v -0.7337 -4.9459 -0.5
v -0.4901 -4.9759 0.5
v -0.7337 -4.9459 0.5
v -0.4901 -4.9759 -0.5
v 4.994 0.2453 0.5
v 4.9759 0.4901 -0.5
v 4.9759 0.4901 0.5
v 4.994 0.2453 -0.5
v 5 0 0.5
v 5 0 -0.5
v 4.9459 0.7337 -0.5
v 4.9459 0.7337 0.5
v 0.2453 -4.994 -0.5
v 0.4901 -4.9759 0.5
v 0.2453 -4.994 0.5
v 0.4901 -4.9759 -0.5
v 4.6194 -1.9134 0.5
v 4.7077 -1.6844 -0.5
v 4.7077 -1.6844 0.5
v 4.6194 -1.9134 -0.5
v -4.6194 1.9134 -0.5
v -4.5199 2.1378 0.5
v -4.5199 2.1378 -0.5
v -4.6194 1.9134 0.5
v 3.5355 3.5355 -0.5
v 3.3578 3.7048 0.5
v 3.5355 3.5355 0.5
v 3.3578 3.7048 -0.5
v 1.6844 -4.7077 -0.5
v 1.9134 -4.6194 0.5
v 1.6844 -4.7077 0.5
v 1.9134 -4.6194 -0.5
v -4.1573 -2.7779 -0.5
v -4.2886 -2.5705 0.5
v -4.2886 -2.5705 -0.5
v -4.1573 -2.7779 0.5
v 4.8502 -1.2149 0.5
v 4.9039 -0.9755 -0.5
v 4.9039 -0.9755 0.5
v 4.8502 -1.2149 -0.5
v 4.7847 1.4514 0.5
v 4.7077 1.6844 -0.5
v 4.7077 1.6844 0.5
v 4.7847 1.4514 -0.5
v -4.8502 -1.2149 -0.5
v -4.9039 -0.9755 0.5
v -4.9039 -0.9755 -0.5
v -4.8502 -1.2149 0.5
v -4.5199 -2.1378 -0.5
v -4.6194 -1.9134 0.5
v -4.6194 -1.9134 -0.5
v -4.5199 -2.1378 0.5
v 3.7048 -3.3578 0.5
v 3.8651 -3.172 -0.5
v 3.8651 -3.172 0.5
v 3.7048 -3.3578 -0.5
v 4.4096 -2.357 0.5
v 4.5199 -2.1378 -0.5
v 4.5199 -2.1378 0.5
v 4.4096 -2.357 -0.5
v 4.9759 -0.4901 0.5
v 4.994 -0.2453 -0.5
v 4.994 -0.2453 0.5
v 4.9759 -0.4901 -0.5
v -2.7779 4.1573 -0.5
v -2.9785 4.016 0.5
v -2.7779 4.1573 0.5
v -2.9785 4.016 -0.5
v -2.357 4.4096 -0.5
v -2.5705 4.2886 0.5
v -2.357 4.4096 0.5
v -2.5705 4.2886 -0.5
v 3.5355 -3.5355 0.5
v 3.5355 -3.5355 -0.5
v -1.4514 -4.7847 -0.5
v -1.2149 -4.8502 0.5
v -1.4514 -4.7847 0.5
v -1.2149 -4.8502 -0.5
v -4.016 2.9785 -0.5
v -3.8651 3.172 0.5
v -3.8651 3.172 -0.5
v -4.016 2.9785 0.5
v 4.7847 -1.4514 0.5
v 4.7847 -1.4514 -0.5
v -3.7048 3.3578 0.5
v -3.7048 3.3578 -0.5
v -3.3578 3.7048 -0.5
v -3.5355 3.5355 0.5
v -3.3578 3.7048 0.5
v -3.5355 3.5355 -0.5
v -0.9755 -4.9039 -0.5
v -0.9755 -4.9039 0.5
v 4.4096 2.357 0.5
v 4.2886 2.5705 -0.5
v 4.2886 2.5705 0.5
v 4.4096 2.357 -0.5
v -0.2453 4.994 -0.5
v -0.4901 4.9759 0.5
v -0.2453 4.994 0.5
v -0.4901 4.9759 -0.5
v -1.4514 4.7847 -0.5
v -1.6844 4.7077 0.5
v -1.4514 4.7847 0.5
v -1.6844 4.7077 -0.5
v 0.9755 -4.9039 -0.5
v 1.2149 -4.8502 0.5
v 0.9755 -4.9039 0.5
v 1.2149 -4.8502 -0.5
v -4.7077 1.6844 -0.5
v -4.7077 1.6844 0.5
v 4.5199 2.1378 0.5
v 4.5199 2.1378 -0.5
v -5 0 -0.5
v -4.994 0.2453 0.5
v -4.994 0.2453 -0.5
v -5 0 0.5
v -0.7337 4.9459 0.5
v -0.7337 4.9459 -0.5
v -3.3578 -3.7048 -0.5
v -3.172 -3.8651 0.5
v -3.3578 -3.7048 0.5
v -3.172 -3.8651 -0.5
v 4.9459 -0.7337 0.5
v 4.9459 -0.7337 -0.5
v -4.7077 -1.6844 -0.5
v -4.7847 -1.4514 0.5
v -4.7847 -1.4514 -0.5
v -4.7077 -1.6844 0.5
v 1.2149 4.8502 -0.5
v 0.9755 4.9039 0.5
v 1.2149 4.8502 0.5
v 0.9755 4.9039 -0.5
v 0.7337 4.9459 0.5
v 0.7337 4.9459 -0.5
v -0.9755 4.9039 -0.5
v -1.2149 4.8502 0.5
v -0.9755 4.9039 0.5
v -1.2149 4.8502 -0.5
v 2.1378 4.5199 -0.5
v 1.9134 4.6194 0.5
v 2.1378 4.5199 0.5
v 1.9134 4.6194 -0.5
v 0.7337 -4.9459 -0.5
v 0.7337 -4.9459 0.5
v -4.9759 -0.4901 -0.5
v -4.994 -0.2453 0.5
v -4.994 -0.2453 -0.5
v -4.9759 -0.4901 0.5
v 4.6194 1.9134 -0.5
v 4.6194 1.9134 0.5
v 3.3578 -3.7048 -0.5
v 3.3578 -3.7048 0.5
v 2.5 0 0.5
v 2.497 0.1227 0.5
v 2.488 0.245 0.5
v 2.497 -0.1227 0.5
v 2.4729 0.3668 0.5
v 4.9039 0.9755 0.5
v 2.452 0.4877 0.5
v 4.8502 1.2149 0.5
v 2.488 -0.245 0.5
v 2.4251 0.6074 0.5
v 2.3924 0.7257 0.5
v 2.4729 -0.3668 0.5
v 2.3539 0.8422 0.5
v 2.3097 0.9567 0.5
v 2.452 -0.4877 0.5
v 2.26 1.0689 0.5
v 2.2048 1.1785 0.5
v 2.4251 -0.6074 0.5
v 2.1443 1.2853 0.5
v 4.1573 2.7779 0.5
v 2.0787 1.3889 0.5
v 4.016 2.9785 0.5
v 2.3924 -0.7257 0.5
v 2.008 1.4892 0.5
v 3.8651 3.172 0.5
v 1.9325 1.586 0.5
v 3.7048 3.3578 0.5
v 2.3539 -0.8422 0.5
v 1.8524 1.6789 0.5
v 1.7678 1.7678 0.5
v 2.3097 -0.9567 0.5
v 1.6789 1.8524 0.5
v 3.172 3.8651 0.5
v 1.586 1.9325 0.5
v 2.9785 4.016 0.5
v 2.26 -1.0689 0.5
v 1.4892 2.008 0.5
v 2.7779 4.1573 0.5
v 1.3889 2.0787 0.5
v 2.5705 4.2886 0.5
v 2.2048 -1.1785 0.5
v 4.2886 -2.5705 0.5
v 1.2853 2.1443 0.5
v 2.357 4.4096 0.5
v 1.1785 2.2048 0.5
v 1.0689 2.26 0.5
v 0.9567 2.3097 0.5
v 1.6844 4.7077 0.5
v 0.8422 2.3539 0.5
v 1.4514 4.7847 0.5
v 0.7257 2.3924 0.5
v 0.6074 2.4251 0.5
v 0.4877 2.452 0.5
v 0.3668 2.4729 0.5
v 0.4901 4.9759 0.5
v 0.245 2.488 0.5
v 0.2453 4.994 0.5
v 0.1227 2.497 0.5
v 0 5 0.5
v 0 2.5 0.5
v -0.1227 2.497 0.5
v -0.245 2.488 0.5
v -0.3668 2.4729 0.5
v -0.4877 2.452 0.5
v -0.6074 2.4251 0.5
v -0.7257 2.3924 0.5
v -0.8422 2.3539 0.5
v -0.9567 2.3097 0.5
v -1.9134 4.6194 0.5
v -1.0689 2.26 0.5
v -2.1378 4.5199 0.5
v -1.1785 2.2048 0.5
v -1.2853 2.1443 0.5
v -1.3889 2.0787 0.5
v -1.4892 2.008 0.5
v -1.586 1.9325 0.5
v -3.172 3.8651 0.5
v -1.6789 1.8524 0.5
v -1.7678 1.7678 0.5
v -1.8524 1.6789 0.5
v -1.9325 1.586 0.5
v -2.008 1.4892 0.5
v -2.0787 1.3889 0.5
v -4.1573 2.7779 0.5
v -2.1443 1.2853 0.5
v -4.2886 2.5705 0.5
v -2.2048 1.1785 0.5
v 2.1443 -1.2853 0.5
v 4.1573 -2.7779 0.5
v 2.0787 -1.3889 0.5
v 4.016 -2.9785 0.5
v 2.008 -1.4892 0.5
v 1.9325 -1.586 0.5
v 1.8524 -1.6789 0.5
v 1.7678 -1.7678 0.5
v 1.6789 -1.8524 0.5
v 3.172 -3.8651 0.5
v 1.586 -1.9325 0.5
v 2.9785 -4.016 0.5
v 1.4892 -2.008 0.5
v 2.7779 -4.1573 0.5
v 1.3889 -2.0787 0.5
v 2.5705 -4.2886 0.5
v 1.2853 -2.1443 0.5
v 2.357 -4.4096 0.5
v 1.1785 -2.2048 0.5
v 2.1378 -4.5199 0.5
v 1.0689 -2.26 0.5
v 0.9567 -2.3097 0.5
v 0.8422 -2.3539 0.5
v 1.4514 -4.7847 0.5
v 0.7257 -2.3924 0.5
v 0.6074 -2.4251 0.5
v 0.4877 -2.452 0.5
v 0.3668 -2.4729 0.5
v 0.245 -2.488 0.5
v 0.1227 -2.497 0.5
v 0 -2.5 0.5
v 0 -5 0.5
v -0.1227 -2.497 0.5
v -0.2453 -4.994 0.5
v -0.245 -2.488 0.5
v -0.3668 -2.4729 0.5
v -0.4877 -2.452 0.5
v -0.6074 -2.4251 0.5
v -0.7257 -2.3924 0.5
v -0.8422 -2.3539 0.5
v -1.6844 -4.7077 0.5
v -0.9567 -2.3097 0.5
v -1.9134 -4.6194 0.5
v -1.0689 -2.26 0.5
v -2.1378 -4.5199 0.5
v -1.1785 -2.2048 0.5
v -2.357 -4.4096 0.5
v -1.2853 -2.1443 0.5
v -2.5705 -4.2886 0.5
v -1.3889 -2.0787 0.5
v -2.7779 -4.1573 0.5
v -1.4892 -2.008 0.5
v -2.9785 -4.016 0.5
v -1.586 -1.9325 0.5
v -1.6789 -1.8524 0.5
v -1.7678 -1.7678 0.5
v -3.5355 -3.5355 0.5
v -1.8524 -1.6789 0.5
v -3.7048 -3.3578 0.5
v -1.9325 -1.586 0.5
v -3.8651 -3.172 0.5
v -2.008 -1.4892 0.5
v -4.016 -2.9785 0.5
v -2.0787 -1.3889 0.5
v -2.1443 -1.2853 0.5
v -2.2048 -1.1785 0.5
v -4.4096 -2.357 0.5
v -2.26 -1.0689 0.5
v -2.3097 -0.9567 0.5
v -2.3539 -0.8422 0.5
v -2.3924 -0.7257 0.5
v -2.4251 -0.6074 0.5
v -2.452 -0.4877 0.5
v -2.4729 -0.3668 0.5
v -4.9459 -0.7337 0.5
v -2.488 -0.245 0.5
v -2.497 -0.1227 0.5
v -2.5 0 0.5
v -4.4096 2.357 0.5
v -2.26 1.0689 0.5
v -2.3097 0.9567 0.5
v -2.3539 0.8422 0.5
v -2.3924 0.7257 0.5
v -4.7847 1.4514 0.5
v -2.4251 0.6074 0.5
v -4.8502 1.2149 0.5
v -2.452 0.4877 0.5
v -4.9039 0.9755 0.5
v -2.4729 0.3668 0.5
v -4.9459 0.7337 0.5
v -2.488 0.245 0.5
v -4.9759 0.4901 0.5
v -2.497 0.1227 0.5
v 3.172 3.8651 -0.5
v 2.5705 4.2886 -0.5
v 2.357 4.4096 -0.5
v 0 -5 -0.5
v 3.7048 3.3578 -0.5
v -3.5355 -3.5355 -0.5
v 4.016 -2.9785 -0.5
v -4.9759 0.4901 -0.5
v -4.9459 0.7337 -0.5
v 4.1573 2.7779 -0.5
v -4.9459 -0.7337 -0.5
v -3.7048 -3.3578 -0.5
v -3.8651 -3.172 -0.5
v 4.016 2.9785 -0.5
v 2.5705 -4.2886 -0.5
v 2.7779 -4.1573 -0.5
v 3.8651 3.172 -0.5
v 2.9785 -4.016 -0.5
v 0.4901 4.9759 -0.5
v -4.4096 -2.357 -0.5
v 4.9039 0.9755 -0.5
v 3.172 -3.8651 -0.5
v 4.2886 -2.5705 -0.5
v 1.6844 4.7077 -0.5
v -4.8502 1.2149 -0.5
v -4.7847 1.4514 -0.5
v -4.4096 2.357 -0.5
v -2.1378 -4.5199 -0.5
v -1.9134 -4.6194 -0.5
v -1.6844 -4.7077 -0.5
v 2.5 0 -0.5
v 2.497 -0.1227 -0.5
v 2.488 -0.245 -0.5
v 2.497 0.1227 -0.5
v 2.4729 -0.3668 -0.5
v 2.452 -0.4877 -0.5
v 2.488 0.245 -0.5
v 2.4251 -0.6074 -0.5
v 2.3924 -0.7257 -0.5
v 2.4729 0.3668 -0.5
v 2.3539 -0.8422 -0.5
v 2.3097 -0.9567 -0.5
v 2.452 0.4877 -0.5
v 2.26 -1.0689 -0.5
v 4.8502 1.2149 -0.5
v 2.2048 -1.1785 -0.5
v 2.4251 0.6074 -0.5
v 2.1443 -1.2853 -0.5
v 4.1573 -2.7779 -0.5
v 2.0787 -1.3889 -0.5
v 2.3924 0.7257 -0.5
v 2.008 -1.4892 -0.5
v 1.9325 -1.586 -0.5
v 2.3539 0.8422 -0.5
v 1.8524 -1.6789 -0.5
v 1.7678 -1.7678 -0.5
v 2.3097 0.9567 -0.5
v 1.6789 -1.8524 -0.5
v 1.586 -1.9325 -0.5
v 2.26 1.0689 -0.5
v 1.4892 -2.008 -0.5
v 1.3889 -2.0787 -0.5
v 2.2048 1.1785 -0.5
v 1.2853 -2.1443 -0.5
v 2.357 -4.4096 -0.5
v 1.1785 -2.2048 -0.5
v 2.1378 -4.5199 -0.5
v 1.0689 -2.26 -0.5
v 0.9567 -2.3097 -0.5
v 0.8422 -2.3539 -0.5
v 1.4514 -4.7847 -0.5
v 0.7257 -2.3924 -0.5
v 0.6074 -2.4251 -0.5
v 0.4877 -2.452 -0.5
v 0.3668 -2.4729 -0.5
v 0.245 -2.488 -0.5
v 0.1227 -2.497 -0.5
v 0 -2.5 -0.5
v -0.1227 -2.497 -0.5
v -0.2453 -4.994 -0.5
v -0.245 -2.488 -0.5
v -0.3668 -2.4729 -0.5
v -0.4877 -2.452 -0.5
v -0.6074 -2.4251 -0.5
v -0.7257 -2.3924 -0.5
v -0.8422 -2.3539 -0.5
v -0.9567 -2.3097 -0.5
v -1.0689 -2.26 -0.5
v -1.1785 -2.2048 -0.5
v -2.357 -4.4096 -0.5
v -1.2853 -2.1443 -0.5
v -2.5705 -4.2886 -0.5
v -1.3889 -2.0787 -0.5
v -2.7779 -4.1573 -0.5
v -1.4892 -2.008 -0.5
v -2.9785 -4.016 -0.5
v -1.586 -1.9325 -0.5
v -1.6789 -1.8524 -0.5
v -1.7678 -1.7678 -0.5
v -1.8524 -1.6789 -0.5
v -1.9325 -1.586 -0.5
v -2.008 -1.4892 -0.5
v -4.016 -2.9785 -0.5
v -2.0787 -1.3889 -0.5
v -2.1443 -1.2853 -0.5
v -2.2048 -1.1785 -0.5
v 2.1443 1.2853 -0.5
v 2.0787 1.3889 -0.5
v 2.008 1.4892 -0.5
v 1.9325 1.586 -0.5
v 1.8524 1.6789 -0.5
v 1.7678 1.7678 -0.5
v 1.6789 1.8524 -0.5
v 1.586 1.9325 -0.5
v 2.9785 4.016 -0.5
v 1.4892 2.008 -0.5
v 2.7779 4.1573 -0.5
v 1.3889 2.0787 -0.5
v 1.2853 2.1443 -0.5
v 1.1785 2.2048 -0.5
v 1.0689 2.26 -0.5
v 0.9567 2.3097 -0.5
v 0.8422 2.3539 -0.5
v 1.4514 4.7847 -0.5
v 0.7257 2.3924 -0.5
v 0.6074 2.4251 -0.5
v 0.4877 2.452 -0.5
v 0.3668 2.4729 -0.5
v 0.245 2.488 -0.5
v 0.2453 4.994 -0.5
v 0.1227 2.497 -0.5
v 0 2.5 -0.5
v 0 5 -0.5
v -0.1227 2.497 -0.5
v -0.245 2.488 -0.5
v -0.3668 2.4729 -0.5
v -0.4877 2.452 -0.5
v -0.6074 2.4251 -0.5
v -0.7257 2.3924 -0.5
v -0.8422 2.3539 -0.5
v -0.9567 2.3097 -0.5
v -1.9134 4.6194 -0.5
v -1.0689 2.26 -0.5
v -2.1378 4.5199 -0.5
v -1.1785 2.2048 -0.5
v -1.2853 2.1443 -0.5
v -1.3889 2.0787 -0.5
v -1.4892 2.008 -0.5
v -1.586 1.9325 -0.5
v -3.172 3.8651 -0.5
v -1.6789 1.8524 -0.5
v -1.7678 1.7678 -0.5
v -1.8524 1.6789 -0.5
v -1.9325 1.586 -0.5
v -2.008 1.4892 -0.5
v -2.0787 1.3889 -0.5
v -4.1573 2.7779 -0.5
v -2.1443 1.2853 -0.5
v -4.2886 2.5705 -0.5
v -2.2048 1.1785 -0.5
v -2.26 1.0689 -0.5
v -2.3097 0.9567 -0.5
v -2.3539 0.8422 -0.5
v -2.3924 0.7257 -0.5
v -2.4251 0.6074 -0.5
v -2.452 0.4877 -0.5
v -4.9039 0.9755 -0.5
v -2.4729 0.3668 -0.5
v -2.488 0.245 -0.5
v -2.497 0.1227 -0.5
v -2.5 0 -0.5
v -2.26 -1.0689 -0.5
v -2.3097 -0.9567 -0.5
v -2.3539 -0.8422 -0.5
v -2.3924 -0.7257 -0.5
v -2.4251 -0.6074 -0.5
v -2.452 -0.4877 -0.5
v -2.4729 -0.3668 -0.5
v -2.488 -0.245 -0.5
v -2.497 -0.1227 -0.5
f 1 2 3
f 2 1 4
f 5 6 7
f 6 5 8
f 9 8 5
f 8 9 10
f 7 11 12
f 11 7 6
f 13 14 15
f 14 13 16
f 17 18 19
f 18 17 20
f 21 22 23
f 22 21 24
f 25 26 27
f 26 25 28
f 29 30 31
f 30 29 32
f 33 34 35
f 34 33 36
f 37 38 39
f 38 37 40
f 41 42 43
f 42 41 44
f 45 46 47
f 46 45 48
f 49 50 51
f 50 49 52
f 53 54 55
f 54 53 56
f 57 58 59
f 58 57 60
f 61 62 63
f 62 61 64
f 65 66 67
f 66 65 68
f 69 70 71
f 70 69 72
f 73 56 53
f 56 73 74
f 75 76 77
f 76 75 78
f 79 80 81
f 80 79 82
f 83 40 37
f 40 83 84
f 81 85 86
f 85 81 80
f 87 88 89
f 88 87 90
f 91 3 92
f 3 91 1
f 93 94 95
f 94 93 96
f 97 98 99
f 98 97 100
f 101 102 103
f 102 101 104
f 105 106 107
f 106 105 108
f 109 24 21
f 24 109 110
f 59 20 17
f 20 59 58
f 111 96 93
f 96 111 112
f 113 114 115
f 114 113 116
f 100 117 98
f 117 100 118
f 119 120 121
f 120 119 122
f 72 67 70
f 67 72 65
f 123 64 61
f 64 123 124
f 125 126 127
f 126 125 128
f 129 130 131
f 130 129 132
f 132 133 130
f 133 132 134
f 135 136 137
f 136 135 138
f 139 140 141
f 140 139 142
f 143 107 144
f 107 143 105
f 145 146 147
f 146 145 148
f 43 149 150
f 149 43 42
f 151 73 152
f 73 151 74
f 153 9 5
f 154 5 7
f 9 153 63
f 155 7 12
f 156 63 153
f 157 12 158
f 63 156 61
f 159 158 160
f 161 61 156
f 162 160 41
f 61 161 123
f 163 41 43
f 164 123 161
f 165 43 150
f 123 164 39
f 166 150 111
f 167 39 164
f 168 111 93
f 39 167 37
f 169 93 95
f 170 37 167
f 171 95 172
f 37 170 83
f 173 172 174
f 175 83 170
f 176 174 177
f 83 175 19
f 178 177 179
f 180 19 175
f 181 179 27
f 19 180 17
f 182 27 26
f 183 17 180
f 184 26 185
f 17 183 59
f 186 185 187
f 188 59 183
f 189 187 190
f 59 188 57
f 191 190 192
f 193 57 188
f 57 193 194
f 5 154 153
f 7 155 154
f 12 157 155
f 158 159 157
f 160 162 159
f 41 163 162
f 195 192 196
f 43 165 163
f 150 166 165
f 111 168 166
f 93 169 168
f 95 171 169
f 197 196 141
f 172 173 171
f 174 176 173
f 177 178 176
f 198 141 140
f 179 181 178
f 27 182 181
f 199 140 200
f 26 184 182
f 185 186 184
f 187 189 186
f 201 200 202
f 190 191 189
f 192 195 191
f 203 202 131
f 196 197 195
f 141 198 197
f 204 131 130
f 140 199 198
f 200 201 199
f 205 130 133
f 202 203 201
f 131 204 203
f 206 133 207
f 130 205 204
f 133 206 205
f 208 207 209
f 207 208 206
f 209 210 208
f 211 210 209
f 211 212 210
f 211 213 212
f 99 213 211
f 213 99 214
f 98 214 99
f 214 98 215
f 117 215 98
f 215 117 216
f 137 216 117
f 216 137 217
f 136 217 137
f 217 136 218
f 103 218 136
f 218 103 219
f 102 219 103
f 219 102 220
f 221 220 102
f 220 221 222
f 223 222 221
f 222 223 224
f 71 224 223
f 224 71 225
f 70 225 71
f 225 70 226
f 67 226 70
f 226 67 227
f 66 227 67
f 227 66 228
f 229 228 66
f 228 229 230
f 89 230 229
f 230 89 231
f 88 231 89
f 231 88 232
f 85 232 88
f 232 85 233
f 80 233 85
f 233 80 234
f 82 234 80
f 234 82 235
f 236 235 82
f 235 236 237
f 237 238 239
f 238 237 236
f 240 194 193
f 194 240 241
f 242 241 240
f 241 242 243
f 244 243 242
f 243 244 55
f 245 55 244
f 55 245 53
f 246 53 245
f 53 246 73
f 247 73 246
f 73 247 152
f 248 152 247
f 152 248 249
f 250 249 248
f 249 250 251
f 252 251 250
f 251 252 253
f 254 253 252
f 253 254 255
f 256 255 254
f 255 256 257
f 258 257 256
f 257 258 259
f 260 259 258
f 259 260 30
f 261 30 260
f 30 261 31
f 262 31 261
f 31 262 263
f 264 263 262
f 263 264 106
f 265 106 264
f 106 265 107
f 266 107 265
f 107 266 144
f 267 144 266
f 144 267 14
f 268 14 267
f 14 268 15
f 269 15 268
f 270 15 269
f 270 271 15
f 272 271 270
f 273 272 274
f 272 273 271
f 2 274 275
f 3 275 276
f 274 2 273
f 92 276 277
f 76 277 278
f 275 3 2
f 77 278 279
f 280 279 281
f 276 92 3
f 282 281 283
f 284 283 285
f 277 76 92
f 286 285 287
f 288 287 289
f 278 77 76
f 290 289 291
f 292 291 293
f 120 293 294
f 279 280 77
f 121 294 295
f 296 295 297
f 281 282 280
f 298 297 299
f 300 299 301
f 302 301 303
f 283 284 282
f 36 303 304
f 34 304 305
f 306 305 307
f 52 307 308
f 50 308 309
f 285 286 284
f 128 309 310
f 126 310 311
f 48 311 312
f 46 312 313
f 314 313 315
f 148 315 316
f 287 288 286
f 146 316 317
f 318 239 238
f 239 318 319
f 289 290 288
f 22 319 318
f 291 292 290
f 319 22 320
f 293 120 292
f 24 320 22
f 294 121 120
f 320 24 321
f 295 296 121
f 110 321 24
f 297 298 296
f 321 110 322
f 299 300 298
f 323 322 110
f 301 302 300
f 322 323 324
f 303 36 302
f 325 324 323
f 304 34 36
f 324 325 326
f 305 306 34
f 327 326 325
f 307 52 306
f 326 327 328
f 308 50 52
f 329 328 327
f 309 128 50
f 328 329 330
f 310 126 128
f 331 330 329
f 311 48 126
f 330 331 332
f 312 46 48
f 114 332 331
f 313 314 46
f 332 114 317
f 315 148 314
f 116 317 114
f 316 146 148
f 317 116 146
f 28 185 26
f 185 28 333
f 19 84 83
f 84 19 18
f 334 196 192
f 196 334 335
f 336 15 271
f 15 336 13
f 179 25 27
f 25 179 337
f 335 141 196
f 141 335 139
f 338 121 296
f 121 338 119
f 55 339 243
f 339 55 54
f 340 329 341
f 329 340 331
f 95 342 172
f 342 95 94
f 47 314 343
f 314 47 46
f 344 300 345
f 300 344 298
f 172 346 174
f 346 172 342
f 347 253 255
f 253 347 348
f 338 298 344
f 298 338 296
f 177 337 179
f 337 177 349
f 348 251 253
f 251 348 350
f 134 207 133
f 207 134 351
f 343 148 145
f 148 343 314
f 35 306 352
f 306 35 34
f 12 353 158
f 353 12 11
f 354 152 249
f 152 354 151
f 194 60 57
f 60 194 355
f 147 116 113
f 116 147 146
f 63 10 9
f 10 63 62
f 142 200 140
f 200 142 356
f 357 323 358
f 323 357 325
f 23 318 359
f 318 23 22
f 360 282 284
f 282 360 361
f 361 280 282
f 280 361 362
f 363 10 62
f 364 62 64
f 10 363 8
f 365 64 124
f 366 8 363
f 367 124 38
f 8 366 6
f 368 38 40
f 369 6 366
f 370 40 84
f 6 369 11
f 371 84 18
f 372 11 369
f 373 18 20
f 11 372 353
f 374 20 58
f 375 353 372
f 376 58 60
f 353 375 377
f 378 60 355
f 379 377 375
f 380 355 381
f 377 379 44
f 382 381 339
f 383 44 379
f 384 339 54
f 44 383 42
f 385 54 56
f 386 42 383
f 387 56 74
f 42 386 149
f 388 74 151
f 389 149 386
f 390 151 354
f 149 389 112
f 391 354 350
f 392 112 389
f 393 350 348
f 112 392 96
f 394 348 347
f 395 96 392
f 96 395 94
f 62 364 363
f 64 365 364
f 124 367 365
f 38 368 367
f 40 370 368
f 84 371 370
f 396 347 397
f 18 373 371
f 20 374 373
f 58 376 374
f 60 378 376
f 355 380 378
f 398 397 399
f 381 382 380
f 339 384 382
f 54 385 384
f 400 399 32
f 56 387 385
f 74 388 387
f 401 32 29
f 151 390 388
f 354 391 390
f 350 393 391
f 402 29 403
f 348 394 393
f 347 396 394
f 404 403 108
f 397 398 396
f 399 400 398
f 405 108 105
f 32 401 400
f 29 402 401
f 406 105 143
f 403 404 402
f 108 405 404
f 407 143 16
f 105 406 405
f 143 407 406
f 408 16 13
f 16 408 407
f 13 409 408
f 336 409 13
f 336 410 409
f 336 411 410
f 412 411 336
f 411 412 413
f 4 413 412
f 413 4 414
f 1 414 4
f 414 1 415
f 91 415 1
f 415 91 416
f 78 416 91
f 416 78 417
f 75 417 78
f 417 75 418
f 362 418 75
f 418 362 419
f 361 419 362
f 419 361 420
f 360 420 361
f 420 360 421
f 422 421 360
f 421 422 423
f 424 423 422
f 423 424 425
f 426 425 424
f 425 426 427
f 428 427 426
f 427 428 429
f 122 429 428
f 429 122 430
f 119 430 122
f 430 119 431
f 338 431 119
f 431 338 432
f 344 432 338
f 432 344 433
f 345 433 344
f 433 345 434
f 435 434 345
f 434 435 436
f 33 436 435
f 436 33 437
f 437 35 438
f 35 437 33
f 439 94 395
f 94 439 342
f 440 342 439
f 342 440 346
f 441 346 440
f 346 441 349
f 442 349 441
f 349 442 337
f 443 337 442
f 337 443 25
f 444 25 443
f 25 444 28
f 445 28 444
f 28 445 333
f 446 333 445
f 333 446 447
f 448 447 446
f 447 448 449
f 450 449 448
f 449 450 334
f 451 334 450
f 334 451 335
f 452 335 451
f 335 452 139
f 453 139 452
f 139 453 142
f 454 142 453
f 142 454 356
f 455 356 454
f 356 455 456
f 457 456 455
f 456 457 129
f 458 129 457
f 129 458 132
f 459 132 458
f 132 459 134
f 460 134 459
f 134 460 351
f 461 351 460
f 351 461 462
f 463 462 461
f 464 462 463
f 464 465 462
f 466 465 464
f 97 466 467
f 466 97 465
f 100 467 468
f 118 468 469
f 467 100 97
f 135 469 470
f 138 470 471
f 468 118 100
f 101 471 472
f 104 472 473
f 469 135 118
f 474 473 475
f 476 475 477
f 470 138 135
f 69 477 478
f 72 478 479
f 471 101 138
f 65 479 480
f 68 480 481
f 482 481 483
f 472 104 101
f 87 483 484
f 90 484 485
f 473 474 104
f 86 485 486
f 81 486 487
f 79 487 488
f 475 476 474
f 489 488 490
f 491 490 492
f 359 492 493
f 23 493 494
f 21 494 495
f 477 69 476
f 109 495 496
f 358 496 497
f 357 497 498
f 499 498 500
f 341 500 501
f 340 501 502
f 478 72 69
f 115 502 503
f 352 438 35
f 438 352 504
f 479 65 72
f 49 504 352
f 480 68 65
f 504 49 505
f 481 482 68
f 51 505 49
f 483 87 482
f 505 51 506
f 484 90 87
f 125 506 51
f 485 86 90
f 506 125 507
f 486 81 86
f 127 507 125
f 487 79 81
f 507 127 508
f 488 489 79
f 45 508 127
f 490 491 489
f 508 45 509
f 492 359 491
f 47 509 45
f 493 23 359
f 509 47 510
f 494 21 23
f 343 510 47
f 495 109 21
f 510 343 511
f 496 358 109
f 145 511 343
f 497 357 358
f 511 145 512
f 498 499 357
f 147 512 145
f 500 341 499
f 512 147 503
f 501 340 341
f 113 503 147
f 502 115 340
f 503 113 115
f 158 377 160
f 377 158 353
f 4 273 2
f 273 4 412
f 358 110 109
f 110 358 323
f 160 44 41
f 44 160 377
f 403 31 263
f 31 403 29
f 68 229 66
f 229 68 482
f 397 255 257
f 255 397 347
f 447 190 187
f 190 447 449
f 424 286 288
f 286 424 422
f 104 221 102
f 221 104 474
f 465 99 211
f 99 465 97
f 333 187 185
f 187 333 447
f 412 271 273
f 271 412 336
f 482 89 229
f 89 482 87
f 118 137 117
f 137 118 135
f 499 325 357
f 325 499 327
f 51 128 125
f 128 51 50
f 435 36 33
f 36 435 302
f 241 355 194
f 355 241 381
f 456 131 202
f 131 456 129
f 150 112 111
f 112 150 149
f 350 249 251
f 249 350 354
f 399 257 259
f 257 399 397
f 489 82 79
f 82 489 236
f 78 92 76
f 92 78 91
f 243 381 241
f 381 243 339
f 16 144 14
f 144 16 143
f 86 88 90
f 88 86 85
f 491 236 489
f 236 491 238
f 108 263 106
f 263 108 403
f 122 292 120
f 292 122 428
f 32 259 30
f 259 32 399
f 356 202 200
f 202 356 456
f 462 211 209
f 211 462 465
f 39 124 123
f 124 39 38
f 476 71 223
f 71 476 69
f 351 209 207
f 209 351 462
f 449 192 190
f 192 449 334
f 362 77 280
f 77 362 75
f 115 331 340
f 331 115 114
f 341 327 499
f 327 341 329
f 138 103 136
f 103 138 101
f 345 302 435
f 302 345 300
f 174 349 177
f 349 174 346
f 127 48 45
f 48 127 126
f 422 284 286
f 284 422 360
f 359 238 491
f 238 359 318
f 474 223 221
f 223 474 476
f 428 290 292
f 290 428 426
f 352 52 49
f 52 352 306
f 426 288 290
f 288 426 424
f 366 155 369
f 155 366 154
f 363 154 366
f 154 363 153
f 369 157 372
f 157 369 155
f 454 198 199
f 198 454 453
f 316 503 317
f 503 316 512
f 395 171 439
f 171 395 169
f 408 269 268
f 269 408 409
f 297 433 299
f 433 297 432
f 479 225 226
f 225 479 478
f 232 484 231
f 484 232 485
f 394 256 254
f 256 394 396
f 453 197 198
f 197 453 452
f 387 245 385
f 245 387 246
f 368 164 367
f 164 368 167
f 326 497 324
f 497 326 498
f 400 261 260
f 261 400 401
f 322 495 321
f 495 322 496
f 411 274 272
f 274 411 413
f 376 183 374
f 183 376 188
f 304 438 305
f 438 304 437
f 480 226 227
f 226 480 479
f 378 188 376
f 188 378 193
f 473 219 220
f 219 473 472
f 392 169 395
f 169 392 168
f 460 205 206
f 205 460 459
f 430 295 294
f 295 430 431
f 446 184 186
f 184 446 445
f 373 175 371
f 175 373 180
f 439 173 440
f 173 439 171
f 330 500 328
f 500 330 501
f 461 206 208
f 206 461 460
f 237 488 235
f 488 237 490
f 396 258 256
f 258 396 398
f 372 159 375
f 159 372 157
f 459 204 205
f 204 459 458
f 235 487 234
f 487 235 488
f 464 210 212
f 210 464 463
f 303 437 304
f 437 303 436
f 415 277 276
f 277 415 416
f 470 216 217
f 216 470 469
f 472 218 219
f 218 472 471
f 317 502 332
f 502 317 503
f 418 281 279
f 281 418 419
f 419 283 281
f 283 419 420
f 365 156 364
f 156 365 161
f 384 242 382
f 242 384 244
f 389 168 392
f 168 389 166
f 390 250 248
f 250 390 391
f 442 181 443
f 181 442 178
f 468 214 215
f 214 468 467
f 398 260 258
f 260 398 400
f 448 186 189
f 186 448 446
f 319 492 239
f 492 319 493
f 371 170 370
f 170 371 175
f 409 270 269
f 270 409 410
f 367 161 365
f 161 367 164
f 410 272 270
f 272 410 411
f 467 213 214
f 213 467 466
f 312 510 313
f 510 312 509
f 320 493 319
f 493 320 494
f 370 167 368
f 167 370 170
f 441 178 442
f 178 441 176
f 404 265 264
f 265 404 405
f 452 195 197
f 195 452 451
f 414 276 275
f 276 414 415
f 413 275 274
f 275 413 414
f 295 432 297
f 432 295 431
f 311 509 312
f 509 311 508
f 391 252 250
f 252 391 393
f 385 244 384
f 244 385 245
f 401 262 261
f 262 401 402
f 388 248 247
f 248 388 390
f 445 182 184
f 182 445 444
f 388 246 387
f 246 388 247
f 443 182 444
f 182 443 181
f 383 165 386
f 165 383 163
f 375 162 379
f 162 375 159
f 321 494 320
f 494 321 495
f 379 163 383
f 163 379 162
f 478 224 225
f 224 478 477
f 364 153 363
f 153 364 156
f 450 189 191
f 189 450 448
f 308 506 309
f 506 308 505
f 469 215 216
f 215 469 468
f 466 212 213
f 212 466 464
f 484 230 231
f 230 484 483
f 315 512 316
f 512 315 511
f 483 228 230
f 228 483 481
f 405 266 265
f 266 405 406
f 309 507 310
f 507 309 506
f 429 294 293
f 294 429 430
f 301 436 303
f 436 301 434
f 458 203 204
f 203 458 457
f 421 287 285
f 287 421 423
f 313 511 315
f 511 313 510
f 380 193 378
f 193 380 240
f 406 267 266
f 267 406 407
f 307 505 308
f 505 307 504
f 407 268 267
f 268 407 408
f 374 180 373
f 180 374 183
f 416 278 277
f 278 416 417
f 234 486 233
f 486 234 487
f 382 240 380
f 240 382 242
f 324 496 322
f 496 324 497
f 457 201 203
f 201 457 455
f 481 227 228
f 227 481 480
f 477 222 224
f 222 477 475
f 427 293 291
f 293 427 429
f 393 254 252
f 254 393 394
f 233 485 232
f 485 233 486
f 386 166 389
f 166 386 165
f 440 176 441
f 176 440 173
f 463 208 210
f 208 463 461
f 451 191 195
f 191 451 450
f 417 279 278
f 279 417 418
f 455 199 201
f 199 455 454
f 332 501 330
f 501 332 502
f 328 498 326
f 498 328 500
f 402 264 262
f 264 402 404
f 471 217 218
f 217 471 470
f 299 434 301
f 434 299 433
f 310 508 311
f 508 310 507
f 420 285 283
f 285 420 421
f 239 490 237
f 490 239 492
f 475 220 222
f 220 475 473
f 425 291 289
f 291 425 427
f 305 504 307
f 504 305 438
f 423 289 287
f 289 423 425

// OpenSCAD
$fn=128;

module washer(id=5.0, od=10.0, thickness=1.0) {
    difference() {
        cylinder(d=od, h=thickness, center=true);
        cylinder(d=id, h=thickness+0.2, center=true);
    }
}

washer();
